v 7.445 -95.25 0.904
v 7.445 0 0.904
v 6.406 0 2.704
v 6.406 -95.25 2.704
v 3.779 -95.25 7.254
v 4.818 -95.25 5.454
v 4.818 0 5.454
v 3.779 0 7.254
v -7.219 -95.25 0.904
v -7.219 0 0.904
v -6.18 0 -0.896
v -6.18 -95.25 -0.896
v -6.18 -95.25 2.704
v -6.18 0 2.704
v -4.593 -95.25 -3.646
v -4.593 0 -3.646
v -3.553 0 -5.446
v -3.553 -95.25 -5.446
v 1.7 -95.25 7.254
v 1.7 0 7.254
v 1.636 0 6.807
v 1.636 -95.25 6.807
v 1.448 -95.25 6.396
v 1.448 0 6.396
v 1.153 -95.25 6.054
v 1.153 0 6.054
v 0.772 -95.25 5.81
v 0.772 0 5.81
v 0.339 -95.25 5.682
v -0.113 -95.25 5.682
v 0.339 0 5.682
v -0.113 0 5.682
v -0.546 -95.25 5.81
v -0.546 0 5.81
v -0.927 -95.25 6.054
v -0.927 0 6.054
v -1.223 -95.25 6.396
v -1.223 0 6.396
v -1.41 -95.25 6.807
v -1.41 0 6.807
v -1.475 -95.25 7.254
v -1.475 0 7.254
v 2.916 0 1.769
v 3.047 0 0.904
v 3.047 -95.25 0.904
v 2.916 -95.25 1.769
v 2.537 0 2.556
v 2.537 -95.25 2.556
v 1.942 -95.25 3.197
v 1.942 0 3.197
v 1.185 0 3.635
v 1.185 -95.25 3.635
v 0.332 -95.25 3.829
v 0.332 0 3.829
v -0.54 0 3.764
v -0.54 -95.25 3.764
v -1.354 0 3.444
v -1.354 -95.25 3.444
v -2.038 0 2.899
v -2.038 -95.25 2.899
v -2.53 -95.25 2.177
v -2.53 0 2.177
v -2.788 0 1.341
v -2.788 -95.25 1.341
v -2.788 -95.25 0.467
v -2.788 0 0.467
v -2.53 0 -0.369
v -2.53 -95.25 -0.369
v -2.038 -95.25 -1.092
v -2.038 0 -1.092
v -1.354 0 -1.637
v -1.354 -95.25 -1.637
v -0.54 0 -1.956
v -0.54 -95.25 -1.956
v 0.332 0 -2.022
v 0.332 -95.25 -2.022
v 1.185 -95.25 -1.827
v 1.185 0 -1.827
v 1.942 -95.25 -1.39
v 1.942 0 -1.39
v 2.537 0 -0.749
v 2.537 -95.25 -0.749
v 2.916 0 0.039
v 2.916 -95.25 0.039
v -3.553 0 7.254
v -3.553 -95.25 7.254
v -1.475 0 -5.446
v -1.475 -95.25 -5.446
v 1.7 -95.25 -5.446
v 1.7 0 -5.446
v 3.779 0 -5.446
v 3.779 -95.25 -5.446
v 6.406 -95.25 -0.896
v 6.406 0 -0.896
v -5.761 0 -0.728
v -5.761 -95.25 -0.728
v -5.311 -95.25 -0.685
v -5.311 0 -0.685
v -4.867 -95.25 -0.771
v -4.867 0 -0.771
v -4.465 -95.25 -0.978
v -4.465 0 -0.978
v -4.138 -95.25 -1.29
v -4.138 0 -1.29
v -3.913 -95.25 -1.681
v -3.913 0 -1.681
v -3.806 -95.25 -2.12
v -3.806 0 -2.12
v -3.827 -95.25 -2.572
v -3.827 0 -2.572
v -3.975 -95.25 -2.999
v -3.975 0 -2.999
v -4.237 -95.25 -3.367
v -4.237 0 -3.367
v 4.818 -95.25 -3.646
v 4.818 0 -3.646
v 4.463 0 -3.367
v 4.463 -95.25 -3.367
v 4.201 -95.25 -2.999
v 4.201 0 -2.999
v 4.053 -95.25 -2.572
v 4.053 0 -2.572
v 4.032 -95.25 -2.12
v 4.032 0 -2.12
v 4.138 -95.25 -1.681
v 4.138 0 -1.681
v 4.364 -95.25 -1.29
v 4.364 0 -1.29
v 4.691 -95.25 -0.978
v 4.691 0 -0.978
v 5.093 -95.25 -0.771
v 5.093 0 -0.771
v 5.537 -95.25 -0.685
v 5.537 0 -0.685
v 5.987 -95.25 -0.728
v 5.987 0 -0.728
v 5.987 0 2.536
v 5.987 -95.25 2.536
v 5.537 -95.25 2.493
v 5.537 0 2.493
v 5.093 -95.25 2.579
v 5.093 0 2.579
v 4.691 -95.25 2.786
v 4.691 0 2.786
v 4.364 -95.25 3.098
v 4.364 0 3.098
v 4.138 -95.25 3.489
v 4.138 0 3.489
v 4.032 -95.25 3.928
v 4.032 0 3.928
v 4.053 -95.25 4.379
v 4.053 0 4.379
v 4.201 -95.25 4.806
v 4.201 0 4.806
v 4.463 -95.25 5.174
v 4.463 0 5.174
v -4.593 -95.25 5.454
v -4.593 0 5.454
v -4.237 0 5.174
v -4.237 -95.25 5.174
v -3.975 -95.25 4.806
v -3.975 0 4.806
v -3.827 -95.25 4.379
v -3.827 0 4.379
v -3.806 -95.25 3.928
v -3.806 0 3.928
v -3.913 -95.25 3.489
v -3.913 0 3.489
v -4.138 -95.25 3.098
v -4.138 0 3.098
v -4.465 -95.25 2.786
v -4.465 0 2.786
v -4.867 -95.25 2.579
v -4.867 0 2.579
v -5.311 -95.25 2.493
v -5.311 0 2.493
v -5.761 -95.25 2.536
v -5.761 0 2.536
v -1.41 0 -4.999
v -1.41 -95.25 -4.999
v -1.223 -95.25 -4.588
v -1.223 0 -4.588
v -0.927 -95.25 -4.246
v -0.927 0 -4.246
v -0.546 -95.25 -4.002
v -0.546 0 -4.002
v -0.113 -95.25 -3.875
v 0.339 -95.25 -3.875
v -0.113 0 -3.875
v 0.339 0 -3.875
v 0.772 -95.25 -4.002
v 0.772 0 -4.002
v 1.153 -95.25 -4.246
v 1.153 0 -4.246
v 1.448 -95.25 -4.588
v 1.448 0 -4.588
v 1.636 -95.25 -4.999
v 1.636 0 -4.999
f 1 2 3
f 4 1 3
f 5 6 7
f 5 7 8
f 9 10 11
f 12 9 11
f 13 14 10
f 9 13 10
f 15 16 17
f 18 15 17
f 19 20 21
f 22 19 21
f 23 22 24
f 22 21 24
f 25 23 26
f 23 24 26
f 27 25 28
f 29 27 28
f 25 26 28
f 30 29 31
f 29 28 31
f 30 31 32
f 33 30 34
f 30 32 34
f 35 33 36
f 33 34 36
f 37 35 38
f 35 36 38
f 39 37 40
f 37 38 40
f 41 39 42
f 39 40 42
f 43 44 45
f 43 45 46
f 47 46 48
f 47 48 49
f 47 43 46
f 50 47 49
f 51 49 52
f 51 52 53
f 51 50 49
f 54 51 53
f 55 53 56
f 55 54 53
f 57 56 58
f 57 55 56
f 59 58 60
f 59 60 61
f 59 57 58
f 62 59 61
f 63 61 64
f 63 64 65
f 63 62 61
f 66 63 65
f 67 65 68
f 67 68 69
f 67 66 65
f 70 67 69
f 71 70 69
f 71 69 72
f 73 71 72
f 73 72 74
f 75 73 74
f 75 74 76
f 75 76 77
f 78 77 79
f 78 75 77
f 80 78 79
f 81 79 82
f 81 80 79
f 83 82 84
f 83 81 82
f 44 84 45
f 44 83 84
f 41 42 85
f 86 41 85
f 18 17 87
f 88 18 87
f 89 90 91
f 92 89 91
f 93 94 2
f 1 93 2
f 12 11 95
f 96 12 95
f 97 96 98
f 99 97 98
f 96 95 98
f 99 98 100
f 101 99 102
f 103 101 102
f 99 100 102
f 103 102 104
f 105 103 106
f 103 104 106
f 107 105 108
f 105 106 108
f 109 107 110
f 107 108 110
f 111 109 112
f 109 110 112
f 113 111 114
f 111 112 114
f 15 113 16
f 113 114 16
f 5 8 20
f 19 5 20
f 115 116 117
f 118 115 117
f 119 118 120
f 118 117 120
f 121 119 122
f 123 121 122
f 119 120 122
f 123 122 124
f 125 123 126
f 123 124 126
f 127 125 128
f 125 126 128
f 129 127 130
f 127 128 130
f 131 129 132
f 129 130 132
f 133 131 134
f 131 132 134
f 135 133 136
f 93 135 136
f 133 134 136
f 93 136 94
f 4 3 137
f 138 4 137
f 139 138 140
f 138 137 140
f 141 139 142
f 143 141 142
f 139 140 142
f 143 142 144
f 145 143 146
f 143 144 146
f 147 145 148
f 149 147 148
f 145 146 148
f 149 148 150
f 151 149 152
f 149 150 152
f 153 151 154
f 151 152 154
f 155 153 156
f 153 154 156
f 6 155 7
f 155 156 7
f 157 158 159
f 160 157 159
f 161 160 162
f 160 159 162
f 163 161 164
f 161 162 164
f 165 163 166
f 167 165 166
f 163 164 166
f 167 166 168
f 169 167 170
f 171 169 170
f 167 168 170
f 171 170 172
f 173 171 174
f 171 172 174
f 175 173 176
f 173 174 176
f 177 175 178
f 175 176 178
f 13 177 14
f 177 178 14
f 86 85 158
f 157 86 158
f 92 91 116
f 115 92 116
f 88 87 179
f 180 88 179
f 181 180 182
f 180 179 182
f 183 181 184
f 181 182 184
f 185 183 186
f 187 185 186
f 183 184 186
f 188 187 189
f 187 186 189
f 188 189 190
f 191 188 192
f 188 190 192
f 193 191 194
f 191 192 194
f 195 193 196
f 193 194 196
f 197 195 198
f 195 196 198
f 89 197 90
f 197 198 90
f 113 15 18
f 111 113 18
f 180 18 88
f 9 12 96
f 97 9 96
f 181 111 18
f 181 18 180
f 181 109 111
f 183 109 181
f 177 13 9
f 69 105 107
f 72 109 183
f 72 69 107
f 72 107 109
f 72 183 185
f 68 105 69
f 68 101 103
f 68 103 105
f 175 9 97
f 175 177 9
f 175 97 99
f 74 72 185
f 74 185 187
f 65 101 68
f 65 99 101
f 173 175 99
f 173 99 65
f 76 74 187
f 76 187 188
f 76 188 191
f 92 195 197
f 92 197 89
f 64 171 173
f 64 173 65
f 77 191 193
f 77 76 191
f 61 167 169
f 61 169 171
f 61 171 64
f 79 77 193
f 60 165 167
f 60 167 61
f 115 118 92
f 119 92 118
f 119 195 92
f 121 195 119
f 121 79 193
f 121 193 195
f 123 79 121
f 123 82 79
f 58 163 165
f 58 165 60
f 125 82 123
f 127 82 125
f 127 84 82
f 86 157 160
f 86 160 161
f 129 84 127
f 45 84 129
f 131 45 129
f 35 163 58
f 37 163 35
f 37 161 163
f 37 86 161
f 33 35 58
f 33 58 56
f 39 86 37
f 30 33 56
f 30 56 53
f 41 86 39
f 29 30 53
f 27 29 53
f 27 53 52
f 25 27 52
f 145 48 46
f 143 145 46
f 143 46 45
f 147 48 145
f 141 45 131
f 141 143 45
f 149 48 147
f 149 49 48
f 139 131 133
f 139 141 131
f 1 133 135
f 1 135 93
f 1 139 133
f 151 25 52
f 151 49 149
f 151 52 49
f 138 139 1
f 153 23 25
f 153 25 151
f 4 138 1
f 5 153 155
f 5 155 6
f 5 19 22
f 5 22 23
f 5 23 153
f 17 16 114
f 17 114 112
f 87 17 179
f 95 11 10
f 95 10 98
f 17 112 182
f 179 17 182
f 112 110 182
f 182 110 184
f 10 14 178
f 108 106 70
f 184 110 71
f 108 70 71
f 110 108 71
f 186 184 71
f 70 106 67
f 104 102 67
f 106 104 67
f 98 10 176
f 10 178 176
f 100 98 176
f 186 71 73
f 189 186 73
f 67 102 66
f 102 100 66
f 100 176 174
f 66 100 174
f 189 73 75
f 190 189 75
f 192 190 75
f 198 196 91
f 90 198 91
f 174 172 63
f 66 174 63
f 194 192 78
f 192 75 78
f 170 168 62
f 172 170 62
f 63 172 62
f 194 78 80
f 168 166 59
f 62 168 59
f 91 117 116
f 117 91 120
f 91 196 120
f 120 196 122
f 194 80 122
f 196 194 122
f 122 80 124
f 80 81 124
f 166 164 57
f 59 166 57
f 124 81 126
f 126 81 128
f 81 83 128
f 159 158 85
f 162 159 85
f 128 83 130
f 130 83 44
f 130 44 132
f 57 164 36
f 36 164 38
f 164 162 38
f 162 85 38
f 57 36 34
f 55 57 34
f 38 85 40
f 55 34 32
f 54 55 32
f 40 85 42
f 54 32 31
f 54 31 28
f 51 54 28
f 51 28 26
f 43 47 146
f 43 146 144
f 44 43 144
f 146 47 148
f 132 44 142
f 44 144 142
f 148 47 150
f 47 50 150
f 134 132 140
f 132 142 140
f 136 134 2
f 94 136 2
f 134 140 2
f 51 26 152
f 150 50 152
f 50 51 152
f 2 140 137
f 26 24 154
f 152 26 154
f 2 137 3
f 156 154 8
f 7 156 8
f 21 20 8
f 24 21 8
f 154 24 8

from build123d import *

# Parameters (mm, degrees)
F0_R     = 2.9337
F1_DEPTH = 95.25


with BuildPart() as f1:
    # F0 (on Front) → F1 (new body)
    with BuildSketch(Plane.XZ):
        with BuildLine():
            ThreePointArc((4.818488, -3.645982), (4.237422, -1.477417), (6.405988, -0.896352))
            Line((6.405988, -0.896352), (7.445324, 0.903833))
            Line((7.445324, 0.903833), (6.405987, 2.704018))
            ThreePointArc((6.405987, 2.704018), (4.237422, 3.285083), (4.818487, 5.453648))
            Line((4.818487, 5.453648), (3.77915, 7.253833))
            Line((3.77915, 7.253833), (1.700476, 7.253833))
            ThreePointArc((1.700476, 7.253833), (0.112976, 5.666333), (-1.474524, 7.253833))
            Line((-1.474524, 7.253833), (-3.553199, 7.253832))
            Line((-3.553199, 7.253832), (-4.592536, 5.453648))
            ThreePointArc((-4.592536, 5.453648), (-4.01147, 3.285082), (-6.180035, 2.704017))
            Line((-6.180035, 2.704017), (-7.219372, 0.903832))
            Line((-7.219372, 0.903832), (-6.180035, -0.896352))
            ThreePointArc((-6.180035, -0.896352), (-4.01147, -1.477418), (-4.592535, -3.645983))
            Line((-4.592535, -3.645983), (-3.553198, -5.446168))
            Line((-3.553198, -5.446168), (-1.474524, -5.446167))
            ThreePointArc((-1.474524, -5.446167), (0.112976, -3.858667), (1.700476, -5.446167))
            Line((1.700476, -5.446167), (3.779151, -5.446167))
            Line((3.779151, -5.446167), (4.818488, -3.645982))
        make_face()
        with Locations((0.112976, 0.903833)):
            Circle(F0_R, mode=Mode.SUBTRACT)
    extrude(amount=F1_DEPTH)


solid = f1.part
